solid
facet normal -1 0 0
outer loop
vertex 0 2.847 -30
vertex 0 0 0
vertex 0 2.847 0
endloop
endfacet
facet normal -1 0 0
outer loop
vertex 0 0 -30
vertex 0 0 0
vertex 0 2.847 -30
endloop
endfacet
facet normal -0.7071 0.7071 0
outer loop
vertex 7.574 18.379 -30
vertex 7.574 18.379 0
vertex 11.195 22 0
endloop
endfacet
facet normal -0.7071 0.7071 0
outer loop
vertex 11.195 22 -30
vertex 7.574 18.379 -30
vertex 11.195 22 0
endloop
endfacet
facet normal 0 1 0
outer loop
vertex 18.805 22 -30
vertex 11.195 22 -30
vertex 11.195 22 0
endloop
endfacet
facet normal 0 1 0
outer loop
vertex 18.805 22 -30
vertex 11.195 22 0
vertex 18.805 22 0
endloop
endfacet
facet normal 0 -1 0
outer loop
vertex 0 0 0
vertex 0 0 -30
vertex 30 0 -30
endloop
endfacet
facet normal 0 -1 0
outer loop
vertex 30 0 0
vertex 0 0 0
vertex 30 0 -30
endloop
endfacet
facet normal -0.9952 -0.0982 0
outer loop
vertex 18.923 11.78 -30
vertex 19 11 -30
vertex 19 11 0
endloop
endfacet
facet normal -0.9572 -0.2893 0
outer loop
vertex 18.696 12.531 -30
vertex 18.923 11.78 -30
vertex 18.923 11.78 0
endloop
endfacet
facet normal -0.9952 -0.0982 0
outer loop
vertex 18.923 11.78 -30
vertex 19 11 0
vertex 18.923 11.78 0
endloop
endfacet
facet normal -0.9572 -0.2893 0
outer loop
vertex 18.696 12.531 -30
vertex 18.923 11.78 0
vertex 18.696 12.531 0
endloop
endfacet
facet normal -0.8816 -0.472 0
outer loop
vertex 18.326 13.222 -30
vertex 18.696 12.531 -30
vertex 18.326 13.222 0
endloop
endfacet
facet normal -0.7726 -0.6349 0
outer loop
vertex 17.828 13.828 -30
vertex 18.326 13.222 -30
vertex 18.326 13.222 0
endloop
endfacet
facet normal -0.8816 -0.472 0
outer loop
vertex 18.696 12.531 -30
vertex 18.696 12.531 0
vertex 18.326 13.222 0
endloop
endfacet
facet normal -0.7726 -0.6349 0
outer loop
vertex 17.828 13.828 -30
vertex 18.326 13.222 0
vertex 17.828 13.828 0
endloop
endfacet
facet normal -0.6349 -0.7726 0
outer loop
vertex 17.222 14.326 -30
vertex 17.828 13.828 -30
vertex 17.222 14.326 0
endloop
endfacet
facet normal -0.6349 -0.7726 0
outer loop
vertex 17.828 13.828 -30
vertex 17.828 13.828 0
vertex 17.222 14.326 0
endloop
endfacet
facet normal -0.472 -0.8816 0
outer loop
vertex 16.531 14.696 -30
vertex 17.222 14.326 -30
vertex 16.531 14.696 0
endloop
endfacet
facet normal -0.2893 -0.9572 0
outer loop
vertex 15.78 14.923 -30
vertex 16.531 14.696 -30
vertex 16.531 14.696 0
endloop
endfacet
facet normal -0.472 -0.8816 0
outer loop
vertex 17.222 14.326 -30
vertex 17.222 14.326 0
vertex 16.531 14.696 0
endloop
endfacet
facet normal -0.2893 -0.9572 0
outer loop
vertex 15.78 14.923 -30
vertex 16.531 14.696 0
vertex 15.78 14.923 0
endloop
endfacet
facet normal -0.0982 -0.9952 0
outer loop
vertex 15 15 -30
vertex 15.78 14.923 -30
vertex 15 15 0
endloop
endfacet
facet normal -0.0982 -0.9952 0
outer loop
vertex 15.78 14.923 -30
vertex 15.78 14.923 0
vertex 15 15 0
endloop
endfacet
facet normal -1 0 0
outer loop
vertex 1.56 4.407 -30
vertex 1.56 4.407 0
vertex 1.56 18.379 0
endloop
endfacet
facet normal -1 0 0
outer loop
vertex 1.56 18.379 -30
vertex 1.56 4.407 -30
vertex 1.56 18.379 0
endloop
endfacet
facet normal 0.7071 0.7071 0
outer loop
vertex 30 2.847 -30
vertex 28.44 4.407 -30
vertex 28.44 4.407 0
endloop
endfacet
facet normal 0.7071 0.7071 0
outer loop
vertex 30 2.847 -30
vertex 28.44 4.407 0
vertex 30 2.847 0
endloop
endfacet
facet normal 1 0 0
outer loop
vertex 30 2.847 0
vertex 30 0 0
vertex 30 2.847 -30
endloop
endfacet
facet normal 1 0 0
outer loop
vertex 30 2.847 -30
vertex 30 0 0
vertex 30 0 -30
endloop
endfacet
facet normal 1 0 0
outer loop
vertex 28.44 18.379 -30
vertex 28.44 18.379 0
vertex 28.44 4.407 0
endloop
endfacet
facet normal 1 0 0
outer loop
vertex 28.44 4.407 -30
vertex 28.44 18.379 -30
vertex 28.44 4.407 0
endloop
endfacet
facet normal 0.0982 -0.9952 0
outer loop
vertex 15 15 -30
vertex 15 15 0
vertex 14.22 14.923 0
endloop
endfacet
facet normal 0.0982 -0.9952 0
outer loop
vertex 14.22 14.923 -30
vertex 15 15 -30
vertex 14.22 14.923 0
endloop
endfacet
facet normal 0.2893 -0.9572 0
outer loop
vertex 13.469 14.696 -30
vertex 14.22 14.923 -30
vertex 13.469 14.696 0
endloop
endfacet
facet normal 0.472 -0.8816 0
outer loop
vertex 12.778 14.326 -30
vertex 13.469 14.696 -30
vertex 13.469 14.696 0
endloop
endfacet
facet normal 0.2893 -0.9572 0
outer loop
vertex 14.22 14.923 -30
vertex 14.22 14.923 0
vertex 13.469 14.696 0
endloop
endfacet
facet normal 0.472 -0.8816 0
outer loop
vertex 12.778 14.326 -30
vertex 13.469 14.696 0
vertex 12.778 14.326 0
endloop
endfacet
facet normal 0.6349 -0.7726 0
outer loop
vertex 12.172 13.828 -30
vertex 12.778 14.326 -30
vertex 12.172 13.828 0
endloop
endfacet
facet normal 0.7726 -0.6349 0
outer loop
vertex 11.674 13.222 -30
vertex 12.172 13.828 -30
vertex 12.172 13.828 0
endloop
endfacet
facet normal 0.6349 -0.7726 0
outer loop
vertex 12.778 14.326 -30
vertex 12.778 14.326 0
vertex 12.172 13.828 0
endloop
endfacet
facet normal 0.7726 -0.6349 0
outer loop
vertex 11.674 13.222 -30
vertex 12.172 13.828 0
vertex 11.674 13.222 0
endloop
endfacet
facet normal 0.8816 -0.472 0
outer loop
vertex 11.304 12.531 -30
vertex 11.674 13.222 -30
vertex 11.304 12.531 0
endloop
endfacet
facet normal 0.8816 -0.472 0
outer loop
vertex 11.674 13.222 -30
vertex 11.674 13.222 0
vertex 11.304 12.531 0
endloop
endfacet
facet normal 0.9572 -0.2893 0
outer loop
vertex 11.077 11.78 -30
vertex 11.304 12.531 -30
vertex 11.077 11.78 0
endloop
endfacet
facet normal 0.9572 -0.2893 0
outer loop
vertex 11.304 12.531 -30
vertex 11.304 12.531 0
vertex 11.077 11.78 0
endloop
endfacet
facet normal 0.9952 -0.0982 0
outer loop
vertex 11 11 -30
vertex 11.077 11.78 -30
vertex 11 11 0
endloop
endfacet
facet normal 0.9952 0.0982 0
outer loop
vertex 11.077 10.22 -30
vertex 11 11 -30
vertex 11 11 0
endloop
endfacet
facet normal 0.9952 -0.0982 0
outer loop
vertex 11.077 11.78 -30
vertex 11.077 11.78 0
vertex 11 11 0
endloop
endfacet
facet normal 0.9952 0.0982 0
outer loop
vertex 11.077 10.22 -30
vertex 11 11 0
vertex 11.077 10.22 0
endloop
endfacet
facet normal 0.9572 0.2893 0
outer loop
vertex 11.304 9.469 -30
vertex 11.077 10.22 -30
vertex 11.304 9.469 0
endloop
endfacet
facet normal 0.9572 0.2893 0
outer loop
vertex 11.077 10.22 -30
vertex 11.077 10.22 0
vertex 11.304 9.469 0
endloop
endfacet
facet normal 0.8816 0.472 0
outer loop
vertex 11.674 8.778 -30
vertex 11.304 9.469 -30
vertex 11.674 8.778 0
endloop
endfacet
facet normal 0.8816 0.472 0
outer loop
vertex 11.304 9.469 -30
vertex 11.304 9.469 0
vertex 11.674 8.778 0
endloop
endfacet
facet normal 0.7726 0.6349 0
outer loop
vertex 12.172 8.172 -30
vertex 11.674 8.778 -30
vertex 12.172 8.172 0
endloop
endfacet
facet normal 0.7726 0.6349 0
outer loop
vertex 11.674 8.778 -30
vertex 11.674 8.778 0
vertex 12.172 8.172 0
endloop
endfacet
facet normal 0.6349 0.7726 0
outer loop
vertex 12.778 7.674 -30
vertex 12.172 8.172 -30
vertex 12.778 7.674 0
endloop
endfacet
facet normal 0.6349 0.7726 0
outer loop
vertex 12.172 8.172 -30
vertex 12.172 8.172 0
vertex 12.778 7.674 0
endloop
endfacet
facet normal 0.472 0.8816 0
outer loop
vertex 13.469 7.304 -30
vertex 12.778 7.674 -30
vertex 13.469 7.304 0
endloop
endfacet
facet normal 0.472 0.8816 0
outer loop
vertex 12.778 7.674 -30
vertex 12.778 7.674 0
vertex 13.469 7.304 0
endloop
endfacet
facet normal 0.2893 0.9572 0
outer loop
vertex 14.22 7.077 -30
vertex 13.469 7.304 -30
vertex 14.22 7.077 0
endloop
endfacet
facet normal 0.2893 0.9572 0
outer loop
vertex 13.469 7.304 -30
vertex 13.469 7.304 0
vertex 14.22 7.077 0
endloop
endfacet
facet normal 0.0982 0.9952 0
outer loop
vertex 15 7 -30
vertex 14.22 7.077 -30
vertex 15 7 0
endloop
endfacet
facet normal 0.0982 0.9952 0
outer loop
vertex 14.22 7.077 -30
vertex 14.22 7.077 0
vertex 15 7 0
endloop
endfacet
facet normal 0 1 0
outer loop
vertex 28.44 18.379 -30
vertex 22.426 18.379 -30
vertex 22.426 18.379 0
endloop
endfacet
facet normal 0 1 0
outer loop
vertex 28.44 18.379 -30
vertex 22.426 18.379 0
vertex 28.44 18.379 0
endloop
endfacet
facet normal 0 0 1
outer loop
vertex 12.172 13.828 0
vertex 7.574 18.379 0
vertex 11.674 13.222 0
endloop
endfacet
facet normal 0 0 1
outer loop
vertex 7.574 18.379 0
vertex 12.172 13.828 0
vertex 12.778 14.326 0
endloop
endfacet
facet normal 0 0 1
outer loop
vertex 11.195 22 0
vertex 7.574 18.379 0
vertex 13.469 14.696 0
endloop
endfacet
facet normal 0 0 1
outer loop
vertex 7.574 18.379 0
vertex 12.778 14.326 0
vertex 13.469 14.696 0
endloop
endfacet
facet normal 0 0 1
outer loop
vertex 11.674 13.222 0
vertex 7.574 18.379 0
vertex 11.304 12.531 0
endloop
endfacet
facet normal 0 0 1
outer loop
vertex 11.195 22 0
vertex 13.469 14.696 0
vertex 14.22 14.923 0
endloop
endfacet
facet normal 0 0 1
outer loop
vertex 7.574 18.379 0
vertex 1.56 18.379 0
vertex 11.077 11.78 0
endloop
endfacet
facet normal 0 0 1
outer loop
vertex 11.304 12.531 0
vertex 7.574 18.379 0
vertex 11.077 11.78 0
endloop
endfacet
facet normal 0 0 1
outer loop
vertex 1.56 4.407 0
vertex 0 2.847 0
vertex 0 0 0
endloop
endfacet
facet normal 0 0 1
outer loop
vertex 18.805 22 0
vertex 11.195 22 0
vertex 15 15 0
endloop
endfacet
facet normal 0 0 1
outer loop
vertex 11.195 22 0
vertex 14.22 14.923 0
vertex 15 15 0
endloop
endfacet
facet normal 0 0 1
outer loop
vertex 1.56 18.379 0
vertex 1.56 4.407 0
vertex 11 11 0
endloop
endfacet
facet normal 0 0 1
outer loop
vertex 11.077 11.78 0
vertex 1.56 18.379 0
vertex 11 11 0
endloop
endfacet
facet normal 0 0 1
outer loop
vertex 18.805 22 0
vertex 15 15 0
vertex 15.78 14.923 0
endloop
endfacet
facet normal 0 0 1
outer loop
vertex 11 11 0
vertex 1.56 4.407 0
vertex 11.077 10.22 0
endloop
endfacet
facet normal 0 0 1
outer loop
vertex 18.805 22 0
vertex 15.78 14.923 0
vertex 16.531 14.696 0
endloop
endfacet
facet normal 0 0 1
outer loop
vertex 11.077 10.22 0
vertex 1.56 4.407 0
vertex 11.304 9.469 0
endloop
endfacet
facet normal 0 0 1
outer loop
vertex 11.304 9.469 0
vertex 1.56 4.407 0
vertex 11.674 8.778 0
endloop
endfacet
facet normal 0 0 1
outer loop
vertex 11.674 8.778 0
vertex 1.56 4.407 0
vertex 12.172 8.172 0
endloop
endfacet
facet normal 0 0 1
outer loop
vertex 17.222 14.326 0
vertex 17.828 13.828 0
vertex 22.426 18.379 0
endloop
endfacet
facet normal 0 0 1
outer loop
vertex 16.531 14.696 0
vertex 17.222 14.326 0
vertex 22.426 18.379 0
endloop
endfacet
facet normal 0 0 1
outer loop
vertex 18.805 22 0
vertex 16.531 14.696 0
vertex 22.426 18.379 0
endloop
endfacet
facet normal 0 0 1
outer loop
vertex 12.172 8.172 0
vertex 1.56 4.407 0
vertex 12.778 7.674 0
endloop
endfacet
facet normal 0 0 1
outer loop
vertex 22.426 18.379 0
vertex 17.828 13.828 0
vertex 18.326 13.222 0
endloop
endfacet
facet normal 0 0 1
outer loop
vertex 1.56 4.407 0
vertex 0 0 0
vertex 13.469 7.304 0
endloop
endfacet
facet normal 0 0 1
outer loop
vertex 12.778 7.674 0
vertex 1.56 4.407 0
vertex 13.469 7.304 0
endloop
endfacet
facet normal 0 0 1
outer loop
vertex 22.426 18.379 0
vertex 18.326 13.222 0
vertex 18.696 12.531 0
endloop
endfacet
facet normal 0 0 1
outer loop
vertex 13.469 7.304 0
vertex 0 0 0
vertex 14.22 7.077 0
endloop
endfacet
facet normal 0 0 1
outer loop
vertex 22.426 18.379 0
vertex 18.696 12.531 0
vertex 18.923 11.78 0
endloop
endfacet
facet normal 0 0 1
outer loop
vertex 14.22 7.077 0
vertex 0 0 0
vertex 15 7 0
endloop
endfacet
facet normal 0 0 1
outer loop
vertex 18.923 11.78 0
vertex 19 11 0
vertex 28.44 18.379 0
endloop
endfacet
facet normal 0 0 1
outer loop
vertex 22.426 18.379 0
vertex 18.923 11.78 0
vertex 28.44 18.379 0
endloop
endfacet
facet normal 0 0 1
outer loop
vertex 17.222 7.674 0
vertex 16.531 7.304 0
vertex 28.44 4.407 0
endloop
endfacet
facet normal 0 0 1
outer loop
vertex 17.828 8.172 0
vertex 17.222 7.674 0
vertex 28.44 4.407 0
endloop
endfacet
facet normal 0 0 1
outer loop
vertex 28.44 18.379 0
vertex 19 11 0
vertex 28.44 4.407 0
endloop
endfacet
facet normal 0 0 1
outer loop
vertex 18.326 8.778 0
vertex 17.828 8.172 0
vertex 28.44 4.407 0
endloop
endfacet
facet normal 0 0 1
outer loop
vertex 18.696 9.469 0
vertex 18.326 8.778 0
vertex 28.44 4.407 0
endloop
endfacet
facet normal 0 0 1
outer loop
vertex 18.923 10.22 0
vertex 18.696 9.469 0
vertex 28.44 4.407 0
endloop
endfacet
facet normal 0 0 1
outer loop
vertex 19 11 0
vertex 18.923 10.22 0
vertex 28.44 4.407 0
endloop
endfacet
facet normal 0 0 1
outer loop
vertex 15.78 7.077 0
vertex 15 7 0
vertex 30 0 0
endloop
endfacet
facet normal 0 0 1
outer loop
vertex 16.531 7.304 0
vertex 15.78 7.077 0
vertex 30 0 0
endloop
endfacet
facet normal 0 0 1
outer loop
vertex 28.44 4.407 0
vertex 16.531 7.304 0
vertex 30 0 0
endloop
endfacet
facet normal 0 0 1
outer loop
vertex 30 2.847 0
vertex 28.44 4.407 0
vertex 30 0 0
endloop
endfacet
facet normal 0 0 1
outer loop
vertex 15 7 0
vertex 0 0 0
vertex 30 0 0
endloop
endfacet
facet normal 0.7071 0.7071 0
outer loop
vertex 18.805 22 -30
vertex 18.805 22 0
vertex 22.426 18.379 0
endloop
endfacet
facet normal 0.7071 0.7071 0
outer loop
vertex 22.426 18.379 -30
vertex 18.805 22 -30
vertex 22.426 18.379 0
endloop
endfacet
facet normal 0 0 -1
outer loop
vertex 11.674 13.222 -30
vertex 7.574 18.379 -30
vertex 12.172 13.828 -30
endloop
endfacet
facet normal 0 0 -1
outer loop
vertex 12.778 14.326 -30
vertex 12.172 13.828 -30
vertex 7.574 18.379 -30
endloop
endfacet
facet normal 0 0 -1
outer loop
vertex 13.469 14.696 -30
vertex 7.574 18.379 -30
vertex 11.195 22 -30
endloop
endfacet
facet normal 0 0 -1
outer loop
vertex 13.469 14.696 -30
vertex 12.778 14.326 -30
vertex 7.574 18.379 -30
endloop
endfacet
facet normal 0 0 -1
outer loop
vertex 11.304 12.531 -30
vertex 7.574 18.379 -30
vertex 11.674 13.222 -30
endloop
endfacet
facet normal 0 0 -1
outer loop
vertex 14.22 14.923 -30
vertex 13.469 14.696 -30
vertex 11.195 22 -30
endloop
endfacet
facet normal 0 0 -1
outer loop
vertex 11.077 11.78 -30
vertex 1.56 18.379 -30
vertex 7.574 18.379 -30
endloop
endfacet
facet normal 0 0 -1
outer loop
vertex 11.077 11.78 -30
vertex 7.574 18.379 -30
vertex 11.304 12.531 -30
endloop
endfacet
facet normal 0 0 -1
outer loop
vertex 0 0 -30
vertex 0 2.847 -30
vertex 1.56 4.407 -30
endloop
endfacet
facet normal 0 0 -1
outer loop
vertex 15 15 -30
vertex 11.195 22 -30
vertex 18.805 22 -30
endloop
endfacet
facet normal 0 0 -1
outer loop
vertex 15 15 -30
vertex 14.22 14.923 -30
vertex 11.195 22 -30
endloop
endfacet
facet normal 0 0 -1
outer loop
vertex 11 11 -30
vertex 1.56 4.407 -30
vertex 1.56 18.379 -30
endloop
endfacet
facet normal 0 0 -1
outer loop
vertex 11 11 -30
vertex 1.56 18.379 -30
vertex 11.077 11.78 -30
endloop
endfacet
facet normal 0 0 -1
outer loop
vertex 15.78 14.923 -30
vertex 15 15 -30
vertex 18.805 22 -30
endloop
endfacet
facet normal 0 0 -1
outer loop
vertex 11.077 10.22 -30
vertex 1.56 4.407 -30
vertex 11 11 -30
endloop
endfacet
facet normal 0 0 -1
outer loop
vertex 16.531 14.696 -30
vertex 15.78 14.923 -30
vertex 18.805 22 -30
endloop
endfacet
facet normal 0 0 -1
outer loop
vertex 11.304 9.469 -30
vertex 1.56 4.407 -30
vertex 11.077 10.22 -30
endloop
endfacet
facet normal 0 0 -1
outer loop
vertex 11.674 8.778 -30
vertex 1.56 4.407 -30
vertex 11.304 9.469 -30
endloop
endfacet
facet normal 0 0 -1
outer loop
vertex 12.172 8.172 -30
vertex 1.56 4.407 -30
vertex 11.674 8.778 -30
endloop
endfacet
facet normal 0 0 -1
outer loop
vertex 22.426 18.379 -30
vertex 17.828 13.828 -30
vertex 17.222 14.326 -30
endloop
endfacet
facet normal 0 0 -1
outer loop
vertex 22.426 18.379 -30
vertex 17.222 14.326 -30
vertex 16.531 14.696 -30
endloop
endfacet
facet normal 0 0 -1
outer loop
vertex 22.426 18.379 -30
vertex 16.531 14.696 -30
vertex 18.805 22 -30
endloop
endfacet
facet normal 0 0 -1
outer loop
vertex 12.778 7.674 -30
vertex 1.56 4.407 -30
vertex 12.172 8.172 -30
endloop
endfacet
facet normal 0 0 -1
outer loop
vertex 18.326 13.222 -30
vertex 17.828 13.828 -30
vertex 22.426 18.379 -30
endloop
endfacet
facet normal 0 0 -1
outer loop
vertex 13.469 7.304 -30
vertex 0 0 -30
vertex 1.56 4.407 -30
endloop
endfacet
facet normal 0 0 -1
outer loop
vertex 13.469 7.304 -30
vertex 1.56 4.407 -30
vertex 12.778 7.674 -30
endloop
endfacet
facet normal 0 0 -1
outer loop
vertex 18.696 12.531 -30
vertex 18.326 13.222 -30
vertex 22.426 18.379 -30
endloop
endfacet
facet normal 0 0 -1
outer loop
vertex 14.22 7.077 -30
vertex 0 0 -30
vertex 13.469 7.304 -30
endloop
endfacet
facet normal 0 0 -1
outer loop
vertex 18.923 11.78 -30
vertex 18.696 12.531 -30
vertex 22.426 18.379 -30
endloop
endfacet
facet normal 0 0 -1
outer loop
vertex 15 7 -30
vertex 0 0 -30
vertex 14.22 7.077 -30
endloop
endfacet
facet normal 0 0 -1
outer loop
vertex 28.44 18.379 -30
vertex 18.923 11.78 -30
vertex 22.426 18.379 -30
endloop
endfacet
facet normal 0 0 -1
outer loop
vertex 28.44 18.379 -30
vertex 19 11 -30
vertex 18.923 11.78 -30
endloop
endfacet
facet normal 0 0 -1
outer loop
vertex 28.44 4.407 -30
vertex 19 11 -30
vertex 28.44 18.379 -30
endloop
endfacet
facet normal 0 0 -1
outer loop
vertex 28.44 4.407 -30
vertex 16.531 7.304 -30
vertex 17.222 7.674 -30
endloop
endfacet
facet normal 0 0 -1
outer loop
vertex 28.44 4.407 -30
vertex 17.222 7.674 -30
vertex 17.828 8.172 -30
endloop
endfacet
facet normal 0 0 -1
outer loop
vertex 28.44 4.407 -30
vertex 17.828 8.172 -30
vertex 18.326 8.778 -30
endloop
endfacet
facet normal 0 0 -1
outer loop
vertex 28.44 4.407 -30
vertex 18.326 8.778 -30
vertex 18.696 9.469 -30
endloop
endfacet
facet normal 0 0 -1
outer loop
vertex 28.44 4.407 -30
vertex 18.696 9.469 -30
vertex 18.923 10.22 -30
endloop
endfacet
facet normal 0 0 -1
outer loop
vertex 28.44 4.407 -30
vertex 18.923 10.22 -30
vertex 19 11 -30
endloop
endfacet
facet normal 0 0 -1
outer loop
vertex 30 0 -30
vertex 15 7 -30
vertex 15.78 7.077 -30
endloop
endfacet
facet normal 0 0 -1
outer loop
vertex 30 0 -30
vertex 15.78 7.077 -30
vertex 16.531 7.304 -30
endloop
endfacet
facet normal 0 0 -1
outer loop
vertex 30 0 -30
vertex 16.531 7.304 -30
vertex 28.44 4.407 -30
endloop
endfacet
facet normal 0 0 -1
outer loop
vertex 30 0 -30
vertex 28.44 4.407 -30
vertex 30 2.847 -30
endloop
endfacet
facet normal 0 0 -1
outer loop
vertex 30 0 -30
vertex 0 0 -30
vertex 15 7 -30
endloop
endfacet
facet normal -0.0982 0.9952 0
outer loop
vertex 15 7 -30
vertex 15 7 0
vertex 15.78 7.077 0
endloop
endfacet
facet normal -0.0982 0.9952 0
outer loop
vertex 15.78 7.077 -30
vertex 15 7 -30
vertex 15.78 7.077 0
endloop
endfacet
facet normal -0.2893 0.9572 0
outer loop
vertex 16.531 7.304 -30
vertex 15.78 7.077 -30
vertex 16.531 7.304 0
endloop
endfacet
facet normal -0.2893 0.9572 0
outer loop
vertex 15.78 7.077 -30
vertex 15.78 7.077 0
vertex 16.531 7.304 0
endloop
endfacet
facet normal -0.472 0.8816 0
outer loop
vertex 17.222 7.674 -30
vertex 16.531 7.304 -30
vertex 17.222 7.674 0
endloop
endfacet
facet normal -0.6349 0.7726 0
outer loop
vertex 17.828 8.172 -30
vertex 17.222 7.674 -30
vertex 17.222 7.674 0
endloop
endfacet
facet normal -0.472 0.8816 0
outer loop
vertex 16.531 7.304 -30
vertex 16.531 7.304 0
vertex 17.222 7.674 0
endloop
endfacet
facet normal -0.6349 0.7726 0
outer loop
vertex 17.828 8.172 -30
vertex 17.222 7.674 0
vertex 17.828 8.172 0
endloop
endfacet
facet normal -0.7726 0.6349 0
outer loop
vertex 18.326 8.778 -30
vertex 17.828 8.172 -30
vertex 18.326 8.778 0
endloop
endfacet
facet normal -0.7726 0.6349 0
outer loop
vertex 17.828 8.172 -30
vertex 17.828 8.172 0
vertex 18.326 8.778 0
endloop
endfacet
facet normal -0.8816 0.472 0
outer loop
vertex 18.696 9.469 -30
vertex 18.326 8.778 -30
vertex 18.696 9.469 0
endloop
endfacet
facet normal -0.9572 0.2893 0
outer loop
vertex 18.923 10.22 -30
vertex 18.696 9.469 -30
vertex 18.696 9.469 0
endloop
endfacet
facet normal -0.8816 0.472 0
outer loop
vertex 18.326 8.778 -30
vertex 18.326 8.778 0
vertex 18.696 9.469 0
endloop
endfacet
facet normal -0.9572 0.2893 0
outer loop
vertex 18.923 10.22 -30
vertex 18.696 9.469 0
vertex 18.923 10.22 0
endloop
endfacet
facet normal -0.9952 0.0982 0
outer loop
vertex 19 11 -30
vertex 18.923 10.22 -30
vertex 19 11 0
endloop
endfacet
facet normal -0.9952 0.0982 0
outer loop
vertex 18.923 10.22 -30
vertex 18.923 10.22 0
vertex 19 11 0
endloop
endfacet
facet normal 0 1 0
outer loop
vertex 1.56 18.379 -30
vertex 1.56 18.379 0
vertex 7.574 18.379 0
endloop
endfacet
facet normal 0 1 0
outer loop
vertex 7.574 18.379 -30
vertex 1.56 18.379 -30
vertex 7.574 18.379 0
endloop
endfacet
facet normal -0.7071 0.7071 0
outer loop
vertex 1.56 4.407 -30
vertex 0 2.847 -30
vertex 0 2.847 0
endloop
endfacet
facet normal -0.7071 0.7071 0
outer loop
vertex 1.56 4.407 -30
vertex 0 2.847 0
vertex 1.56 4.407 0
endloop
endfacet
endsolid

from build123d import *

# Parameters (mm, degrees)
SKETCH1_W           = 30
SKETCH1_H           = 30
BOSS_EXTRUDE1_DEPTH = 22
CUT_EXTRUDE1_DEPTH  = 48.791212581


with BuildPart() as part:
    # Sketch1 → Boss-Extrude1 (new body)
    with BuildSketch(Plane(origin=(0, 0, 0), x_dir=(1, 0, 0), z_dir=(0, 1, 0))):
        with Locations((15, 15)):
            Rectangle(SKETCH1_W, SKETCH1_H)
    extrude(amount=BOSS_EXTRUDE1_DEPTH)

    # Sketch2 → Cut-Extrude1 (cut, through all)
    with BuildSketch(Plane.XY):
        Polygon((7.574494777, 18.379095815), (11.195398962, 22), (0, 22), (0, 2.847414058), (1.559595822, 4.407009879), (1.559595822, 18.379095815), align=None)
        Polygon((30, 22), (18.804601038, 22), (22.425505223, 18.379095815), (28.440404178, 18.379095815), (28.440404178, 4.407009879), (30, 2.847414058), align=None)
        with BuildLine():
            ThreePointArc((19, 11), (17.828427125, 13.828427125), (15, 15))
            Line((15, 15), (15, 7))
            ThreePointArc((15, 7), (17.828427125, 8.171572875), (19, 11))
        make_face()
        with BuildLine():
            Line((15, 7), (15, 15))
            ThreePointArc((15, 15), (11, 11), (15, 7))
        make_face()
    extrude(amount=-CUT_EXTRUDE1_DEPTH, mode=Mode.SUBTRACT)


solid = part.part
